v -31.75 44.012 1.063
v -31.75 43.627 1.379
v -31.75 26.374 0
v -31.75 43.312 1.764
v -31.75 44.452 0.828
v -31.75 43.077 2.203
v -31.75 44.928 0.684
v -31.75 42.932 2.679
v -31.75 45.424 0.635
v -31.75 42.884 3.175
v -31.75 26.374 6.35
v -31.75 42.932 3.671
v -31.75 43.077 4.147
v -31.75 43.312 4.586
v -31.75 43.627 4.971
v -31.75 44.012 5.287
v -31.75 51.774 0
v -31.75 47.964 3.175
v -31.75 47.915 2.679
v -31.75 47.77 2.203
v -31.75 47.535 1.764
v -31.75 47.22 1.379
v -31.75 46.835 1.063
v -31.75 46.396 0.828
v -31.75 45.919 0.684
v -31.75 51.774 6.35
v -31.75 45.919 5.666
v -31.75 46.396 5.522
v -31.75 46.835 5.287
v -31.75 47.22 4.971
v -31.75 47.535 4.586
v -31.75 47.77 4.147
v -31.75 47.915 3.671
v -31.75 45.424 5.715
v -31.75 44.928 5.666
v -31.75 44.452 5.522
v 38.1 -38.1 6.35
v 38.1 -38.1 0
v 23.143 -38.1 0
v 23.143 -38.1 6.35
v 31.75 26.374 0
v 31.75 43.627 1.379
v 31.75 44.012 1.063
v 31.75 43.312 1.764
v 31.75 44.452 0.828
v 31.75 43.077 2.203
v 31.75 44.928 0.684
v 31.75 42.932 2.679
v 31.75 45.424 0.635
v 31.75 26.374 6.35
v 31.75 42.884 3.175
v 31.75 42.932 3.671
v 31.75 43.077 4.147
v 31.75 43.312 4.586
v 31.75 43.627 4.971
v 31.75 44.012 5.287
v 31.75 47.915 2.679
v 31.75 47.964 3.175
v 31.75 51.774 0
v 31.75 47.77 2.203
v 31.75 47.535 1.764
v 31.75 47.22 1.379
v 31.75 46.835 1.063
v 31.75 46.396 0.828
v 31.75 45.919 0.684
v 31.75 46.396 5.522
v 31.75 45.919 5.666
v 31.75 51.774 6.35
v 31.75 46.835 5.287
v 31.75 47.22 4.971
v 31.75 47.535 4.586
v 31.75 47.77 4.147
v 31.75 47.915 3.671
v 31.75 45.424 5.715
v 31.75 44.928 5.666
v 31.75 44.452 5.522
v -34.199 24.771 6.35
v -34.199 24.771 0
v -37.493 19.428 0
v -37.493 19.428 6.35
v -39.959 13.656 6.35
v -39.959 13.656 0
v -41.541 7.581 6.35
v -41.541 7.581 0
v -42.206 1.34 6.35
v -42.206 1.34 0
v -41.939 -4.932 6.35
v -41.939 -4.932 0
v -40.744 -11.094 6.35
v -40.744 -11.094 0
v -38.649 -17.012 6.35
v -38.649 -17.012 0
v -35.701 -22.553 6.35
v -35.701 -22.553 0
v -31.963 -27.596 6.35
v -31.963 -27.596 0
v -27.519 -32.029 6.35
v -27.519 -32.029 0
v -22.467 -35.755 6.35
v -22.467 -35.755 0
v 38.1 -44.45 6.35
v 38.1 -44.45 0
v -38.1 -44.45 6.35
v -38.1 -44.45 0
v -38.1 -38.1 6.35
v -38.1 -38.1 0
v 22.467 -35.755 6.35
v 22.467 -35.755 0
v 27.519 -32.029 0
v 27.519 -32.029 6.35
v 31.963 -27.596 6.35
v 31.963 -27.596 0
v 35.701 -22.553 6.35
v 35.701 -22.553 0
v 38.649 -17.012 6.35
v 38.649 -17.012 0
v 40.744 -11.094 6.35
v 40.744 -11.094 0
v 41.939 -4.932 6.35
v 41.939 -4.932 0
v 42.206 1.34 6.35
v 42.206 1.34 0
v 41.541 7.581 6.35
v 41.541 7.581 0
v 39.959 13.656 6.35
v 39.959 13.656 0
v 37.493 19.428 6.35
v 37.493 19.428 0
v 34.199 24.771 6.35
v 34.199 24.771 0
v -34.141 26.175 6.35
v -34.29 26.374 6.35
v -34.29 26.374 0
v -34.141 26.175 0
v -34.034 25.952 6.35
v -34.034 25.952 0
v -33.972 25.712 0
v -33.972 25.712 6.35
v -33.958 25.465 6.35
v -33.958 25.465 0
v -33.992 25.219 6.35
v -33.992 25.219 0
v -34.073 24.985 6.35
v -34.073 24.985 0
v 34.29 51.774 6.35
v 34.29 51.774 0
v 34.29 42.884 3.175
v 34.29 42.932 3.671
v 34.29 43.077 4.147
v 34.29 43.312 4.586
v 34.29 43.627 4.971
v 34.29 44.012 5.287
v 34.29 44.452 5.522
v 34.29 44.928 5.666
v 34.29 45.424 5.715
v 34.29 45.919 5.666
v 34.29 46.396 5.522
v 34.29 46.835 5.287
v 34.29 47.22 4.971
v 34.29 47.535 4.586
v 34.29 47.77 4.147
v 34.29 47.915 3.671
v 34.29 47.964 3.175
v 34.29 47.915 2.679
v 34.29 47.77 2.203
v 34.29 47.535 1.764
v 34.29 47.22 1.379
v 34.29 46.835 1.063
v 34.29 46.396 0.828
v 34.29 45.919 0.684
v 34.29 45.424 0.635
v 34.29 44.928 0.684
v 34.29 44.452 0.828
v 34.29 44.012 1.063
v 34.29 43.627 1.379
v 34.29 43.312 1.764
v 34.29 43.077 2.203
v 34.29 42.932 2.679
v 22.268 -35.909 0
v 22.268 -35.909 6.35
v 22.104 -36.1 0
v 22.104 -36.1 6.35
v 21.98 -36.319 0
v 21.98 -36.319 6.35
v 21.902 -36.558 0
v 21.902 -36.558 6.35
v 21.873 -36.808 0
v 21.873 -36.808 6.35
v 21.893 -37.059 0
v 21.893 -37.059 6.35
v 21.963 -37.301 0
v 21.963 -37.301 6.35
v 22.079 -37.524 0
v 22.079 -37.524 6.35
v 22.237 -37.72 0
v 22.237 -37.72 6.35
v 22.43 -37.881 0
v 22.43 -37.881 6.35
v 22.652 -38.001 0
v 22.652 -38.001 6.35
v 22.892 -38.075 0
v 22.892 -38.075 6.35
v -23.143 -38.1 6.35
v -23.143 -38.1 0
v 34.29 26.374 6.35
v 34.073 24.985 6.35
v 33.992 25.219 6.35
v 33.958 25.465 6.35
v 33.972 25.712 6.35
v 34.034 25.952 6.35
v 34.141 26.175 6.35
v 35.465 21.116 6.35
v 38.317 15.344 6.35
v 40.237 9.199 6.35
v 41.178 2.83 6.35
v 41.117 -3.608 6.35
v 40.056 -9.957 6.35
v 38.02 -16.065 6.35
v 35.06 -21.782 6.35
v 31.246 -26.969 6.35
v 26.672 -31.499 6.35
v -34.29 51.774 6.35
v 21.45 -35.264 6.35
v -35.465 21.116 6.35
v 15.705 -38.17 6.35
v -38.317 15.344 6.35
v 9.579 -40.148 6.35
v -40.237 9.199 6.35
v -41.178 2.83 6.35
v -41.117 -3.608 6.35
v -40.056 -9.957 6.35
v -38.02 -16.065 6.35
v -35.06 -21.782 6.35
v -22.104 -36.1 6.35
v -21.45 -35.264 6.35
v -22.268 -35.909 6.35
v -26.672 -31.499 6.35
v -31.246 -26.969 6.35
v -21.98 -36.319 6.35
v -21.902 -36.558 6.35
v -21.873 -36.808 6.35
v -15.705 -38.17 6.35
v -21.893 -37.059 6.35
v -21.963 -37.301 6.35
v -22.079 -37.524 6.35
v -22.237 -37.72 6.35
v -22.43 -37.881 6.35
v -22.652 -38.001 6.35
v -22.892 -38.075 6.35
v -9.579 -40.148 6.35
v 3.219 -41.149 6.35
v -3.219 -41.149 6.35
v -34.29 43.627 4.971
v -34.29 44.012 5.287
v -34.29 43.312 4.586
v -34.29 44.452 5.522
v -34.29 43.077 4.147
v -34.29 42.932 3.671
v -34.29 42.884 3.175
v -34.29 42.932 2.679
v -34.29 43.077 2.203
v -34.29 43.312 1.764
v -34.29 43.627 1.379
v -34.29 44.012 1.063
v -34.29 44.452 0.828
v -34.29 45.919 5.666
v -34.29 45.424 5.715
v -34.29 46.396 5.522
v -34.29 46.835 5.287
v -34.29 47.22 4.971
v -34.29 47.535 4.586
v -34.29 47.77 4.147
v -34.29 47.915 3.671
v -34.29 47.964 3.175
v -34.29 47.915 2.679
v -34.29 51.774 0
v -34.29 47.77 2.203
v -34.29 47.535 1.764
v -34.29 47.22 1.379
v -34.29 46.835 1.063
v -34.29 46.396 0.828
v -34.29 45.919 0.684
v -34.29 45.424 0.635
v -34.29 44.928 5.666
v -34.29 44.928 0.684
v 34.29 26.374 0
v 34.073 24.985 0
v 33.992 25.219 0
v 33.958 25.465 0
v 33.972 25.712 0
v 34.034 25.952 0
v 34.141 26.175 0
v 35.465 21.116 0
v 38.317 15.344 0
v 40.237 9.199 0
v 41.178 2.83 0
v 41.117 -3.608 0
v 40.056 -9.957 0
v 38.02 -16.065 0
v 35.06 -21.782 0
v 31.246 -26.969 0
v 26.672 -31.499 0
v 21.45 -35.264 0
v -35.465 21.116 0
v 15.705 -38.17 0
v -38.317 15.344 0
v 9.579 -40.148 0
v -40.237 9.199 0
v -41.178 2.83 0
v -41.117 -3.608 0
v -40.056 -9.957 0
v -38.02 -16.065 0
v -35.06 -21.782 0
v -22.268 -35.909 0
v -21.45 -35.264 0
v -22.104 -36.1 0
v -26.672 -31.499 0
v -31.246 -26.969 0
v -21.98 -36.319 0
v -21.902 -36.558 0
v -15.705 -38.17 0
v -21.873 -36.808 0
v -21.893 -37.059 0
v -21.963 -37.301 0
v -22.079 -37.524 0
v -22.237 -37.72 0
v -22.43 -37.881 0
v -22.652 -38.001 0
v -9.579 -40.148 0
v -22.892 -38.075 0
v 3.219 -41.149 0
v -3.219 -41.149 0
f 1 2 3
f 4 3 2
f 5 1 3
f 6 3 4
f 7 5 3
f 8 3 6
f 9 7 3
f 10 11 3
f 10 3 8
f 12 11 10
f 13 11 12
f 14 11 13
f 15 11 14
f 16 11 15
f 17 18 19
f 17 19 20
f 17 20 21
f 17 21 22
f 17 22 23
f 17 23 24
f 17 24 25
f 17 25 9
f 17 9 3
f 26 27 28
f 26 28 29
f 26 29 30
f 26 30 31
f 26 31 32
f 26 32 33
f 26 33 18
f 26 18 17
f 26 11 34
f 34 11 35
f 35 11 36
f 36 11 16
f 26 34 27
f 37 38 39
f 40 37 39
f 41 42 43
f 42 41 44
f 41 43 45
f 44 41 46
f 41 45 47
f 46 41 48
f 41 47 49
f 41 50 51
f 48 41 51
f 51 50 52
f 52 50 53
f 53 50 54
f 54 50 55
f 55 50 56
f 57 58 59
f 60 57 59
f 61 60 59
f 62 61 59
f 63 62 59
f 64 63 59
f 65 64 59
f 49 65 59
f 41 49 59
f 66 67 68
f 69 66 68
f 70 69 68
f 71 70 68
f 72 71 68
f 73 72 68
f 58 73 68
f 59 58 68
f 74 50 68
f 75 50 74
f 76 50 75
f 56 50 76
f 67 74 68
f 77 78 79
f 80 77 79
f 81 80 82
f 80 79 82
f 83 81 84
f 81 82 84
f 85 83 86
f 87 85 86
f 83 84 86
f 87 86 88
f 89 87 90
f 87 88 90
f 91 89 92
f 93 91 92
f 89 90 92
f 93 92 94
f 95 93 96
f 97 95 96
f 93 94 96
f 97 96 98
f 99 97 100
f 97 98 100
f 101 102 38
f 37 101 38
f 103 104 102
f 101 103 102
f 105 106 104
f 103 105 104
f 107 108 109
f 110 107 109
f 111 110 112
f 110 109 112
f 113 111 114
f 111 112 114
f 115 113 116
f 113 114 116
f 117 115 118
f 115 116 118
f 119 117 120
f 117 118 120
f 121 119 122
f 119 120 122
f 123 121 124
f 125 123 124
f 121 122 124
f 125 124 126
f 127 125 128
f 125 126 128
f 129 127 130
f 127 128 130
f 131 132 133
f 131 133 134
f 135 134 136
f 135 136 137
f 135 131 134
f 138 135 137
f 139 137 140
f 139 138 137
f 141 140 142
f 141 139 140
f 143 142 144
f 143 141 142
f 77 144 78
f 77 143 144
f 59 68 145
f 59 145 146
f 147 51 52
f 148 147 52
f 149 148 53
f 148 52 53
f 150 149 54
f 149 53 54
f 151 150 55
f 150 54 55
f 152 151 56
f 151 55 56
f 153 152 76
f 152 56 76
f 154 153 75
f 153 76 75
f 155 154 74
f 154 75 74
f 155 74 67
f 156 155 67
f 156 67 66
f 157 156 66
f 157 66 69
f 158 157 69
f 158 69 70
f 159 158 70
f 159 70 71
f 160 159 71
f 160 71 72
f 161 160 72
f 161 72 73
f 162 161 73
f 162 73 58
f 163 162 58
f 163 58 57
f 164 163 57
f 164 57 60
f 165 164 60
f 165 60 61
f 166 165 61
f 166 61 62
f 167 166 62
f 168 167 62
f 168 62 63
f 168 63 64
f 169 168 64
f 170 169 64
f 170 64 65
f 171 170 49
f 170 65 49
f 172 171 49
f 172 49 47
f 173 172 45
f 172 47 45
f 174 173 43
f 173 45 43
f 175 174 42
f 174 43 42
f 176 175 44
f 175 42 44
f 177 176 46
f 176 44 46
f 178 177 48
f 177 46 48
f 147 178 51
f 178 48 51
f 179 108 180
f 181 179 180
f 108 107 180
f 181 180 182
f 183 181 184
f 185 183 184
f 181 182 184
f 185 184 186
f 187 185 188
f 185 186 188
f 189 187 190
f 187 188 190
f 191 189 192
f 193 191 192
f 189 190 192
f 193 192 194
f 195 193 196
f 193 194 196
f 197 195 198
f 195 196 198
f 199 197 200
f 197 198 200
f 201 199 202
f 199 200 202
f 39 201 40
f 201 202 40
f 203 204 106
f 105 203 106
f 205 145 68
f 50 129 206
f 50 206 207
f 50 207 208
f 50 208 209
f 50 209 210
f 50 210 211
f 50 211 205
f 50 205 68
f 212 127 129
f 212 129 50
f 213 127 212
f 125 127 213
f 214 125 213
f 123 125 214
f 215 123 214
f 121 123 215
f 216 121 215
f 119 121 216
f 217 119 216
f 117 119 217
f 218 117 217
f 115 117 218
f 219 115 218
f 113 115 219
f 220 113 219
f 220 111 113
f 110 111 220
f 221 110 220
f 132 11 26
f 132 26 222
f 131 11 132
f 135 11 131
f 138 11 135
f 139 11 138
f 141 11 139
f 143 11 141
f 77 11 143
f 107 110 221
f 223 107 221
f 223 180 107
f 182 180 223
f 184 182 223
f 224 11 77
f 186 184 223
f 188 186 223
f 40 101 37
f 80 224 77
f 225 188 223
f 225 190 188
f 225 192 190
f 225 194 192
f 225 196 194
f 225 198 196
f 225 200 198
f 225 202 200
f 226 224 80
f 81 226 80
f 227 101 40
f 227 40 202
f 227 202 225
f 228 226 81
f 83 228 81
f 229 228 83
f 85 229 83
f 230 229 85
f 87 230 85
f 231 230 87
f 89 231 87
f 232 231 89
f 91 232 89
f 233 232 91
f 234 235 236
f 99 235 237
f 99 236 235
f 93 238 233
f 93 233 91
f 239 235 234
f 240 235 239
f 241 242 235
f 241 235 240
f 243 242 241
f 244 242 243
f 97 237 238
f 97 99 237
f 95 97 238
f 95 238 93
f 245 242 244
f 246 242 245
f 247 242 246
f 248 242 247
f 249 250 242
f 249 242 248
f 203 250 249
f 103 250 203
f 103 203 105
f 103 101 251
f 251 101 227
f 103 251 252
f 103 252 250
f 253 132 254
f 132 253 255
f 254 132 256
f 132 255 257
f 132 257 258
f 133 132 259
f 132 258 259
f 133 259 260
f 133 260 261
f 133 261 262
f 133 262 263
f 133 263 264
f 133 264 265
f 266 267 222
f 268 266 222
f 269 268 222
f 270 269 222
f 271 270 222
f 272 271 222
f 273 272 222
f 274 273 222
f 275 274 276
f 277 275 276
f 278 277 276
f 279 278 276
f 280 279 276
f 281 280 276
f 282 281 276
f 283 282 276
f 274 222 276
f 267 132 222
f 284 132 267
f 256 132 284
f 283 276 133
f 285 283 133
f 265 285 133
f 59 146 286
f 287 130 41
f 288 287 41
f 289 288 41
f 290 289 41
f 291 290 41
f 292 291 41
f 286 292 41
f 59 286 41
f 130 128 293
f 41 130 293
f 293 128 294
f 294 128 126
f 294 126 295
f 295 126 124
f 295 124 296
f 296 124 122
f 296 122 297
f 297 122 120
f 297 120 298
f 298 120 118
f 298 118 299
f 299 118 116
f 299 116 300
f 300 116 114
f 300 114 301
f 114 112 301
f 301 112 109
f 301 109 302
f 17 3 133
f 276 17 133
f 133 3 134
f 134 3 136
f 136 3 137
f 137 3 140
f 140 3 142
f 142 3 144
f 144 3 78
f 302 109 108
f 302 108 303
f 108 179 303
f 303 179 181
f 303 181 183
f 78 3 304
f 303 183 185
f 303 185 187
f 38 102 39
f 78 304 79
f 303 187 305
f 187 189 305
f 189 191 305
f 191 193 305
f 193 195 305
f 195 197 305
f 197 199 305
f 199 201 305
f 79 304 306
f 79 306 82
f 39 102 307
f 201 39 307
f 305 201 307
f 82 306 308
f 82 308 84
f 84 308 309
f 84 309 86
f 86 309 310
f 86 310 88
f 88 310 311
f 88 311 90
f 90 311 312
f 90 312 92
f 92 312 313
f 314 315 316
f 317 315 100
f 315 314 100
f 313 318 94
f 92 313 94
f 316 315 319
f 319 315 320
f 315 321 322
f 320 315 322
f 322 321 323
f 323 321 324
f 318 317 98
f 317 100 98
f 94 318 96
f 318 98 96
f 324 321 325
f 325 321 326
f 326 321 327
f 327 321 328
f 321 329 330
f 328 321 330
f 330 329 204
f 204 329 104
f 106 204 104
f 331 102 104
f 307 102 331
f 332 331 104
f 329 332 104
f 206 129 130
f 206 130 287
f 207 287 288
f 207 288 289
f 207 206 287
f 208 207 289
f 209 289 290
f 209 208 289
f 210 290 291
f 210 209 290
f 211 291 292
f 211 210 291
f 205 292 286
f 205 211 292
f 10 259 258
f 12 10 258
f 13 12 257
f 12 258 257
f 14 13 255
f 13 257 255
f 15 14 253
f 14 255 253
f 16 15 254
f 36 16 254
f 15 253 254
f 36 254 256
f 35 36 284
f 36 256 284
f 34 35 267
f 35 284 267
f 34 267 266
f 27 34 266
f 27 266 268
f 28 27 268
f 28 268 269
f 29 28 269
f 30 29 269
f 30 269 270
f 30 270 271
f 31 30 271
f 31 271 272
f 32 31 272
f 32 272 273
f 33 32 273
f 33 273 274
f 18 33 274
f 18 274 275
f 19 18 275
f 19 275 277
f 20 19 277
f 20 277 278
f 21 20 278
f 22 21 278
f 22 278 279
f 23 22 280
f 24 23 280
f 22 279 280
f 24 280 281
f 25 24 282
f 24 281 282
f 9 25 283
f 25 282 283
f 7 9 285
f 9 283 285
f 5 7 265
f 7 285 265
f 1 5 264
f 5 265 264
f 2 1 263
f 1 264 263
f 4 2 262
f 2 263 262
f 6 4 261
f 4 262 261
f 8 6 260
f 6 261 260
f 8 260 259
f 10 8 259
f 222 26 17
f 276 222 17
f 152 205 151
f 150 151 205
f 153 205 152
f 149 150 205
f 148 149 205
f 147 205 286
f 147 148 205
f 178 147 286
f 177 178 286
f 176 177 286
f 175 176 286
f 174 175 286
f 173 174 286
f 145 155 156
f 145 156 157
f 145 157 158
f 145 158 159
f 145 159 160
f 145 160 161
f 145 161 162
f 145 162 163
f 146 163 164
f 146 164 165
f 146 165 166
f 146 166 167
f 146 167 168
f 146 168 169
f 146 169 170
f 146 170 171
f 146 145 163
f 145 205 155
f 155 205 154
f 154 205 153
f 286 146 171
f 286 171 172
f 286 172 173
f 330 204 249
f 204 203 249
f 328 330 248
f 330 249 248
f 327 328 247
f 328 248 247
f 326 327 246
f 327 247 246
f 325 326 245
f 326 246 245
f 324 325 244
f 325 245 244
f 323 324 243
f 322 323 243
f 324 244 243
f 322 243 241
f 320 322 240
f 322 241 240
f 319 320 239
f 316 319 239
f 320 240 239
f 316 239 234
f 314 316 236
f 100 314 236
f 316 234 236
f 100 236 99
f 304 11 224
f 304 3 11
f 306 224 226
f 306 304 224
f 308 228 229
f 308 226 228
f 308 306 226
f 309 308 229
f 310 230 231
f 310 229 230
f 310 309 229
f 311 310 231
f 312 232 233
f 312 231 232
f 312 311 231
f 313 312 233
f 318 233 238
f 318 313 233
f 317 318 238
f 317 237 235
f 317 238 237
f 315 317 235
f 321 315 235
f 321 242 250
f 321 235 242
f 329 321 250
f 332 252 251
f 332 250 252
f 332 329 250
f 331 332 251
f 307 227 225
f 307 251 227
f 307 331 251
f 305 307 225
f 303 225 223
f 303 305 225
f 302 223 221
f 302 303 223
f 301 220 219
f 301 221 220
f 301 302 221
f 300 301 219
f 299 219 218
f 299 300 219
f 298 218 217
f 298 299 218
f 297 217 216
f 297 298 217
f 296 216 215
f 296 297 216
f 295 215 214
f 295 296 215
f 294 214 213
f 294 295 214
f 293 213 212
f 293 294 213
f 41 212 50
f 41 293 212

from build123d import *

# Parameters (mm, degrees)
SKETCH1_R            = 41.275
BOSS_EXTRUDE1_DEPTH  = 6.35
FILLET1_R            = 1.27
SKETCH2_W            = 63.5
SKETCH2_H            = 38.1
CUT_EXTRUDE1_DEPTH   = 6.35
SKETCH3_W            = 6.35
SKETCH3_H            = 25.4
BOSS_EXTRUDE2_DEPTH  = 2.54
FILLET2_R            = 1.27
FILLET2_OF_MIRROR1_R = 1.27
SKETCH6_R            = 2.54
CUT_EXTRUDE2_DEPTH   = 93.605338907


with BuildPart() as part:
    # Sketch1 → Boss-Extrude1 (new body)
    with BuildSketch(Plane.XY):
        with BuildLine():
            Line((-18.208562718, -38.1), (-38.1, -38.1))
            Line((-38.1, -38.1), (-38.1, -44.45))
            Line((-38.1, -44.45), (38.1, -44.45))
            Line((38.1, -44.45), (38.1, -38.1))
            Line((38.1, -38.1), (18.208562718, -38.1))
            ThreePointArc((18.208562718, -38.1), (0, 42.2275), (-18.208562718, -38.1))
        make_face()
        Circle(SKETCH1_R, mode=Mode.SUBTRACT)
    extrude(amount=BOSS_EXTRUDE1_DEPTH)

    # Fillet1
    fillet1_edges = [part.edges().sort_by_distance(p)[0] for p in [
        (-18.208562718, -38.1, 3.175),
        (18.208562718, -38.1, 3.175),
    ]]
    fillet(fillet1_edges, radius=FILLET1_R)

    # Sketch2 → Cut-Extrude1 (cut)
    with BuildSketch(Plane.XY.offset(6.35)):
        with Locations((0, 42.2275)):
            Rectangle(SKETCH2_W, SKETCH2_H)
    cut_extrude1 = extrude(amount=-CUT_EXTRUDE1_DEPTH, mode=Mode.SUBTRACT)

    # Sketch3 → Boss-Extrude2 (add)
    with BuildSketch(Plane(origin=(-31.75, 0, 0), x_dir=(0, 0, -1), z_dir=(1, 0, 0))):
        with Locations((-3.175, 39.073530765)):
            Rectangle(SKETCH3_W, SKETCH3_H)
    boss_extrude2 = extrude(amount=-BOSS_EXTRUDE2_DEPTH)

    # Fillet2
    # the kernel refuses this fillet: 1.27 mm, written as the material it adds along each edge
    with BuildSketch(Plane(origin=(-32.978760305, 26.373530765, 6.35), x_dir=(-0.6057595790113751, -0.7956477439394658, 0), z_dir=(0, 0, -1))) as fillet2_piece_1:
        with BuildLine():
            CenterArc((2.043961499, 1.269638951), FILLET2_R, 190.266768482, 78.366985191)
            Line((0.794296006, 1.043284905), (0.769302696, 1.038757824))
            ThreePointArc((0.769302696, 1.038757824), (0.37693855, 0.537028746), (-0.020209453, 0.015386293))
            Line((-0.020209453, 0.015386293), (0.000605618, -0.025392779))
            ThreePointArc((0.000605618, -0.025392779), (1.006840294, -0.013395128), (2.01307497, -0.025392779))
            Line((2.01307497, -0.025392779), (2.013680588, 0))
        make_face()
    extrude(amount=6.35)

    # Mirror1: Cut-Extrude1, Boss-Extrude2 across plane
    add(cut_extrude1.mirror(Plane(origin=(0, 0, 0), x_dir=(0, 0, 1), z_dir=(1, 0, 0))), mode=Mode.SUBTRACT)
    add(boss_extrude2.mirror(Plane(origin=(0, 0, 0), x_dir=(0, 0, 1), z_dir=(1, 0, 0))))

    # Fillet2 of Mirror1
    # the kernel refuses this fillet: 1.27 mm, written as the material it adds along each edge
    with BuildSketch(Plane(origin=(32.978760305, 26.373530765, 6.35), x_dir=(1, 0, 0), z_dir=(0, 0, -1))) as fillet2_of_mirror1_piece_1:
        with BuildLine():
            CenterArc((2.248334624, 0.857177399), FILLET2_OF_MIRROR1_R, 144.082725892, 78.366985191)
            Line((1.219806305, 1.602180417), (1.199235739, 1.617080477))
            ThreePointArc((1.199235739, 1.617080477), (0.59924535, 0.809204435), (-0.019836848, 0.015863778))
            Line((-0.019836848, 0.015863778), (0, -0.0254))
            ThreePointArc((0, -0.0254), (0.655619848, -0.0254), (1.292497796, -0.017143548))
            Line((1.292497796, -0.017143548), (1.311239695, 0))
        make_face()
    extrude(amount=6.35)

    # Sketch6 → Cut-Extrude2 (cut, through all)
    with BuildSketch(Plane.ZY.offset(34.29)):
        with Locations(Location((3.175, 45.423530765, 0), (0, 0, 270))):
            Circle(SKETCH6_R)
    extrude(amount=-CUT_EXTRUDE2_DEPTH, mode=Mode.SUBTRACT)


solid = part.part
